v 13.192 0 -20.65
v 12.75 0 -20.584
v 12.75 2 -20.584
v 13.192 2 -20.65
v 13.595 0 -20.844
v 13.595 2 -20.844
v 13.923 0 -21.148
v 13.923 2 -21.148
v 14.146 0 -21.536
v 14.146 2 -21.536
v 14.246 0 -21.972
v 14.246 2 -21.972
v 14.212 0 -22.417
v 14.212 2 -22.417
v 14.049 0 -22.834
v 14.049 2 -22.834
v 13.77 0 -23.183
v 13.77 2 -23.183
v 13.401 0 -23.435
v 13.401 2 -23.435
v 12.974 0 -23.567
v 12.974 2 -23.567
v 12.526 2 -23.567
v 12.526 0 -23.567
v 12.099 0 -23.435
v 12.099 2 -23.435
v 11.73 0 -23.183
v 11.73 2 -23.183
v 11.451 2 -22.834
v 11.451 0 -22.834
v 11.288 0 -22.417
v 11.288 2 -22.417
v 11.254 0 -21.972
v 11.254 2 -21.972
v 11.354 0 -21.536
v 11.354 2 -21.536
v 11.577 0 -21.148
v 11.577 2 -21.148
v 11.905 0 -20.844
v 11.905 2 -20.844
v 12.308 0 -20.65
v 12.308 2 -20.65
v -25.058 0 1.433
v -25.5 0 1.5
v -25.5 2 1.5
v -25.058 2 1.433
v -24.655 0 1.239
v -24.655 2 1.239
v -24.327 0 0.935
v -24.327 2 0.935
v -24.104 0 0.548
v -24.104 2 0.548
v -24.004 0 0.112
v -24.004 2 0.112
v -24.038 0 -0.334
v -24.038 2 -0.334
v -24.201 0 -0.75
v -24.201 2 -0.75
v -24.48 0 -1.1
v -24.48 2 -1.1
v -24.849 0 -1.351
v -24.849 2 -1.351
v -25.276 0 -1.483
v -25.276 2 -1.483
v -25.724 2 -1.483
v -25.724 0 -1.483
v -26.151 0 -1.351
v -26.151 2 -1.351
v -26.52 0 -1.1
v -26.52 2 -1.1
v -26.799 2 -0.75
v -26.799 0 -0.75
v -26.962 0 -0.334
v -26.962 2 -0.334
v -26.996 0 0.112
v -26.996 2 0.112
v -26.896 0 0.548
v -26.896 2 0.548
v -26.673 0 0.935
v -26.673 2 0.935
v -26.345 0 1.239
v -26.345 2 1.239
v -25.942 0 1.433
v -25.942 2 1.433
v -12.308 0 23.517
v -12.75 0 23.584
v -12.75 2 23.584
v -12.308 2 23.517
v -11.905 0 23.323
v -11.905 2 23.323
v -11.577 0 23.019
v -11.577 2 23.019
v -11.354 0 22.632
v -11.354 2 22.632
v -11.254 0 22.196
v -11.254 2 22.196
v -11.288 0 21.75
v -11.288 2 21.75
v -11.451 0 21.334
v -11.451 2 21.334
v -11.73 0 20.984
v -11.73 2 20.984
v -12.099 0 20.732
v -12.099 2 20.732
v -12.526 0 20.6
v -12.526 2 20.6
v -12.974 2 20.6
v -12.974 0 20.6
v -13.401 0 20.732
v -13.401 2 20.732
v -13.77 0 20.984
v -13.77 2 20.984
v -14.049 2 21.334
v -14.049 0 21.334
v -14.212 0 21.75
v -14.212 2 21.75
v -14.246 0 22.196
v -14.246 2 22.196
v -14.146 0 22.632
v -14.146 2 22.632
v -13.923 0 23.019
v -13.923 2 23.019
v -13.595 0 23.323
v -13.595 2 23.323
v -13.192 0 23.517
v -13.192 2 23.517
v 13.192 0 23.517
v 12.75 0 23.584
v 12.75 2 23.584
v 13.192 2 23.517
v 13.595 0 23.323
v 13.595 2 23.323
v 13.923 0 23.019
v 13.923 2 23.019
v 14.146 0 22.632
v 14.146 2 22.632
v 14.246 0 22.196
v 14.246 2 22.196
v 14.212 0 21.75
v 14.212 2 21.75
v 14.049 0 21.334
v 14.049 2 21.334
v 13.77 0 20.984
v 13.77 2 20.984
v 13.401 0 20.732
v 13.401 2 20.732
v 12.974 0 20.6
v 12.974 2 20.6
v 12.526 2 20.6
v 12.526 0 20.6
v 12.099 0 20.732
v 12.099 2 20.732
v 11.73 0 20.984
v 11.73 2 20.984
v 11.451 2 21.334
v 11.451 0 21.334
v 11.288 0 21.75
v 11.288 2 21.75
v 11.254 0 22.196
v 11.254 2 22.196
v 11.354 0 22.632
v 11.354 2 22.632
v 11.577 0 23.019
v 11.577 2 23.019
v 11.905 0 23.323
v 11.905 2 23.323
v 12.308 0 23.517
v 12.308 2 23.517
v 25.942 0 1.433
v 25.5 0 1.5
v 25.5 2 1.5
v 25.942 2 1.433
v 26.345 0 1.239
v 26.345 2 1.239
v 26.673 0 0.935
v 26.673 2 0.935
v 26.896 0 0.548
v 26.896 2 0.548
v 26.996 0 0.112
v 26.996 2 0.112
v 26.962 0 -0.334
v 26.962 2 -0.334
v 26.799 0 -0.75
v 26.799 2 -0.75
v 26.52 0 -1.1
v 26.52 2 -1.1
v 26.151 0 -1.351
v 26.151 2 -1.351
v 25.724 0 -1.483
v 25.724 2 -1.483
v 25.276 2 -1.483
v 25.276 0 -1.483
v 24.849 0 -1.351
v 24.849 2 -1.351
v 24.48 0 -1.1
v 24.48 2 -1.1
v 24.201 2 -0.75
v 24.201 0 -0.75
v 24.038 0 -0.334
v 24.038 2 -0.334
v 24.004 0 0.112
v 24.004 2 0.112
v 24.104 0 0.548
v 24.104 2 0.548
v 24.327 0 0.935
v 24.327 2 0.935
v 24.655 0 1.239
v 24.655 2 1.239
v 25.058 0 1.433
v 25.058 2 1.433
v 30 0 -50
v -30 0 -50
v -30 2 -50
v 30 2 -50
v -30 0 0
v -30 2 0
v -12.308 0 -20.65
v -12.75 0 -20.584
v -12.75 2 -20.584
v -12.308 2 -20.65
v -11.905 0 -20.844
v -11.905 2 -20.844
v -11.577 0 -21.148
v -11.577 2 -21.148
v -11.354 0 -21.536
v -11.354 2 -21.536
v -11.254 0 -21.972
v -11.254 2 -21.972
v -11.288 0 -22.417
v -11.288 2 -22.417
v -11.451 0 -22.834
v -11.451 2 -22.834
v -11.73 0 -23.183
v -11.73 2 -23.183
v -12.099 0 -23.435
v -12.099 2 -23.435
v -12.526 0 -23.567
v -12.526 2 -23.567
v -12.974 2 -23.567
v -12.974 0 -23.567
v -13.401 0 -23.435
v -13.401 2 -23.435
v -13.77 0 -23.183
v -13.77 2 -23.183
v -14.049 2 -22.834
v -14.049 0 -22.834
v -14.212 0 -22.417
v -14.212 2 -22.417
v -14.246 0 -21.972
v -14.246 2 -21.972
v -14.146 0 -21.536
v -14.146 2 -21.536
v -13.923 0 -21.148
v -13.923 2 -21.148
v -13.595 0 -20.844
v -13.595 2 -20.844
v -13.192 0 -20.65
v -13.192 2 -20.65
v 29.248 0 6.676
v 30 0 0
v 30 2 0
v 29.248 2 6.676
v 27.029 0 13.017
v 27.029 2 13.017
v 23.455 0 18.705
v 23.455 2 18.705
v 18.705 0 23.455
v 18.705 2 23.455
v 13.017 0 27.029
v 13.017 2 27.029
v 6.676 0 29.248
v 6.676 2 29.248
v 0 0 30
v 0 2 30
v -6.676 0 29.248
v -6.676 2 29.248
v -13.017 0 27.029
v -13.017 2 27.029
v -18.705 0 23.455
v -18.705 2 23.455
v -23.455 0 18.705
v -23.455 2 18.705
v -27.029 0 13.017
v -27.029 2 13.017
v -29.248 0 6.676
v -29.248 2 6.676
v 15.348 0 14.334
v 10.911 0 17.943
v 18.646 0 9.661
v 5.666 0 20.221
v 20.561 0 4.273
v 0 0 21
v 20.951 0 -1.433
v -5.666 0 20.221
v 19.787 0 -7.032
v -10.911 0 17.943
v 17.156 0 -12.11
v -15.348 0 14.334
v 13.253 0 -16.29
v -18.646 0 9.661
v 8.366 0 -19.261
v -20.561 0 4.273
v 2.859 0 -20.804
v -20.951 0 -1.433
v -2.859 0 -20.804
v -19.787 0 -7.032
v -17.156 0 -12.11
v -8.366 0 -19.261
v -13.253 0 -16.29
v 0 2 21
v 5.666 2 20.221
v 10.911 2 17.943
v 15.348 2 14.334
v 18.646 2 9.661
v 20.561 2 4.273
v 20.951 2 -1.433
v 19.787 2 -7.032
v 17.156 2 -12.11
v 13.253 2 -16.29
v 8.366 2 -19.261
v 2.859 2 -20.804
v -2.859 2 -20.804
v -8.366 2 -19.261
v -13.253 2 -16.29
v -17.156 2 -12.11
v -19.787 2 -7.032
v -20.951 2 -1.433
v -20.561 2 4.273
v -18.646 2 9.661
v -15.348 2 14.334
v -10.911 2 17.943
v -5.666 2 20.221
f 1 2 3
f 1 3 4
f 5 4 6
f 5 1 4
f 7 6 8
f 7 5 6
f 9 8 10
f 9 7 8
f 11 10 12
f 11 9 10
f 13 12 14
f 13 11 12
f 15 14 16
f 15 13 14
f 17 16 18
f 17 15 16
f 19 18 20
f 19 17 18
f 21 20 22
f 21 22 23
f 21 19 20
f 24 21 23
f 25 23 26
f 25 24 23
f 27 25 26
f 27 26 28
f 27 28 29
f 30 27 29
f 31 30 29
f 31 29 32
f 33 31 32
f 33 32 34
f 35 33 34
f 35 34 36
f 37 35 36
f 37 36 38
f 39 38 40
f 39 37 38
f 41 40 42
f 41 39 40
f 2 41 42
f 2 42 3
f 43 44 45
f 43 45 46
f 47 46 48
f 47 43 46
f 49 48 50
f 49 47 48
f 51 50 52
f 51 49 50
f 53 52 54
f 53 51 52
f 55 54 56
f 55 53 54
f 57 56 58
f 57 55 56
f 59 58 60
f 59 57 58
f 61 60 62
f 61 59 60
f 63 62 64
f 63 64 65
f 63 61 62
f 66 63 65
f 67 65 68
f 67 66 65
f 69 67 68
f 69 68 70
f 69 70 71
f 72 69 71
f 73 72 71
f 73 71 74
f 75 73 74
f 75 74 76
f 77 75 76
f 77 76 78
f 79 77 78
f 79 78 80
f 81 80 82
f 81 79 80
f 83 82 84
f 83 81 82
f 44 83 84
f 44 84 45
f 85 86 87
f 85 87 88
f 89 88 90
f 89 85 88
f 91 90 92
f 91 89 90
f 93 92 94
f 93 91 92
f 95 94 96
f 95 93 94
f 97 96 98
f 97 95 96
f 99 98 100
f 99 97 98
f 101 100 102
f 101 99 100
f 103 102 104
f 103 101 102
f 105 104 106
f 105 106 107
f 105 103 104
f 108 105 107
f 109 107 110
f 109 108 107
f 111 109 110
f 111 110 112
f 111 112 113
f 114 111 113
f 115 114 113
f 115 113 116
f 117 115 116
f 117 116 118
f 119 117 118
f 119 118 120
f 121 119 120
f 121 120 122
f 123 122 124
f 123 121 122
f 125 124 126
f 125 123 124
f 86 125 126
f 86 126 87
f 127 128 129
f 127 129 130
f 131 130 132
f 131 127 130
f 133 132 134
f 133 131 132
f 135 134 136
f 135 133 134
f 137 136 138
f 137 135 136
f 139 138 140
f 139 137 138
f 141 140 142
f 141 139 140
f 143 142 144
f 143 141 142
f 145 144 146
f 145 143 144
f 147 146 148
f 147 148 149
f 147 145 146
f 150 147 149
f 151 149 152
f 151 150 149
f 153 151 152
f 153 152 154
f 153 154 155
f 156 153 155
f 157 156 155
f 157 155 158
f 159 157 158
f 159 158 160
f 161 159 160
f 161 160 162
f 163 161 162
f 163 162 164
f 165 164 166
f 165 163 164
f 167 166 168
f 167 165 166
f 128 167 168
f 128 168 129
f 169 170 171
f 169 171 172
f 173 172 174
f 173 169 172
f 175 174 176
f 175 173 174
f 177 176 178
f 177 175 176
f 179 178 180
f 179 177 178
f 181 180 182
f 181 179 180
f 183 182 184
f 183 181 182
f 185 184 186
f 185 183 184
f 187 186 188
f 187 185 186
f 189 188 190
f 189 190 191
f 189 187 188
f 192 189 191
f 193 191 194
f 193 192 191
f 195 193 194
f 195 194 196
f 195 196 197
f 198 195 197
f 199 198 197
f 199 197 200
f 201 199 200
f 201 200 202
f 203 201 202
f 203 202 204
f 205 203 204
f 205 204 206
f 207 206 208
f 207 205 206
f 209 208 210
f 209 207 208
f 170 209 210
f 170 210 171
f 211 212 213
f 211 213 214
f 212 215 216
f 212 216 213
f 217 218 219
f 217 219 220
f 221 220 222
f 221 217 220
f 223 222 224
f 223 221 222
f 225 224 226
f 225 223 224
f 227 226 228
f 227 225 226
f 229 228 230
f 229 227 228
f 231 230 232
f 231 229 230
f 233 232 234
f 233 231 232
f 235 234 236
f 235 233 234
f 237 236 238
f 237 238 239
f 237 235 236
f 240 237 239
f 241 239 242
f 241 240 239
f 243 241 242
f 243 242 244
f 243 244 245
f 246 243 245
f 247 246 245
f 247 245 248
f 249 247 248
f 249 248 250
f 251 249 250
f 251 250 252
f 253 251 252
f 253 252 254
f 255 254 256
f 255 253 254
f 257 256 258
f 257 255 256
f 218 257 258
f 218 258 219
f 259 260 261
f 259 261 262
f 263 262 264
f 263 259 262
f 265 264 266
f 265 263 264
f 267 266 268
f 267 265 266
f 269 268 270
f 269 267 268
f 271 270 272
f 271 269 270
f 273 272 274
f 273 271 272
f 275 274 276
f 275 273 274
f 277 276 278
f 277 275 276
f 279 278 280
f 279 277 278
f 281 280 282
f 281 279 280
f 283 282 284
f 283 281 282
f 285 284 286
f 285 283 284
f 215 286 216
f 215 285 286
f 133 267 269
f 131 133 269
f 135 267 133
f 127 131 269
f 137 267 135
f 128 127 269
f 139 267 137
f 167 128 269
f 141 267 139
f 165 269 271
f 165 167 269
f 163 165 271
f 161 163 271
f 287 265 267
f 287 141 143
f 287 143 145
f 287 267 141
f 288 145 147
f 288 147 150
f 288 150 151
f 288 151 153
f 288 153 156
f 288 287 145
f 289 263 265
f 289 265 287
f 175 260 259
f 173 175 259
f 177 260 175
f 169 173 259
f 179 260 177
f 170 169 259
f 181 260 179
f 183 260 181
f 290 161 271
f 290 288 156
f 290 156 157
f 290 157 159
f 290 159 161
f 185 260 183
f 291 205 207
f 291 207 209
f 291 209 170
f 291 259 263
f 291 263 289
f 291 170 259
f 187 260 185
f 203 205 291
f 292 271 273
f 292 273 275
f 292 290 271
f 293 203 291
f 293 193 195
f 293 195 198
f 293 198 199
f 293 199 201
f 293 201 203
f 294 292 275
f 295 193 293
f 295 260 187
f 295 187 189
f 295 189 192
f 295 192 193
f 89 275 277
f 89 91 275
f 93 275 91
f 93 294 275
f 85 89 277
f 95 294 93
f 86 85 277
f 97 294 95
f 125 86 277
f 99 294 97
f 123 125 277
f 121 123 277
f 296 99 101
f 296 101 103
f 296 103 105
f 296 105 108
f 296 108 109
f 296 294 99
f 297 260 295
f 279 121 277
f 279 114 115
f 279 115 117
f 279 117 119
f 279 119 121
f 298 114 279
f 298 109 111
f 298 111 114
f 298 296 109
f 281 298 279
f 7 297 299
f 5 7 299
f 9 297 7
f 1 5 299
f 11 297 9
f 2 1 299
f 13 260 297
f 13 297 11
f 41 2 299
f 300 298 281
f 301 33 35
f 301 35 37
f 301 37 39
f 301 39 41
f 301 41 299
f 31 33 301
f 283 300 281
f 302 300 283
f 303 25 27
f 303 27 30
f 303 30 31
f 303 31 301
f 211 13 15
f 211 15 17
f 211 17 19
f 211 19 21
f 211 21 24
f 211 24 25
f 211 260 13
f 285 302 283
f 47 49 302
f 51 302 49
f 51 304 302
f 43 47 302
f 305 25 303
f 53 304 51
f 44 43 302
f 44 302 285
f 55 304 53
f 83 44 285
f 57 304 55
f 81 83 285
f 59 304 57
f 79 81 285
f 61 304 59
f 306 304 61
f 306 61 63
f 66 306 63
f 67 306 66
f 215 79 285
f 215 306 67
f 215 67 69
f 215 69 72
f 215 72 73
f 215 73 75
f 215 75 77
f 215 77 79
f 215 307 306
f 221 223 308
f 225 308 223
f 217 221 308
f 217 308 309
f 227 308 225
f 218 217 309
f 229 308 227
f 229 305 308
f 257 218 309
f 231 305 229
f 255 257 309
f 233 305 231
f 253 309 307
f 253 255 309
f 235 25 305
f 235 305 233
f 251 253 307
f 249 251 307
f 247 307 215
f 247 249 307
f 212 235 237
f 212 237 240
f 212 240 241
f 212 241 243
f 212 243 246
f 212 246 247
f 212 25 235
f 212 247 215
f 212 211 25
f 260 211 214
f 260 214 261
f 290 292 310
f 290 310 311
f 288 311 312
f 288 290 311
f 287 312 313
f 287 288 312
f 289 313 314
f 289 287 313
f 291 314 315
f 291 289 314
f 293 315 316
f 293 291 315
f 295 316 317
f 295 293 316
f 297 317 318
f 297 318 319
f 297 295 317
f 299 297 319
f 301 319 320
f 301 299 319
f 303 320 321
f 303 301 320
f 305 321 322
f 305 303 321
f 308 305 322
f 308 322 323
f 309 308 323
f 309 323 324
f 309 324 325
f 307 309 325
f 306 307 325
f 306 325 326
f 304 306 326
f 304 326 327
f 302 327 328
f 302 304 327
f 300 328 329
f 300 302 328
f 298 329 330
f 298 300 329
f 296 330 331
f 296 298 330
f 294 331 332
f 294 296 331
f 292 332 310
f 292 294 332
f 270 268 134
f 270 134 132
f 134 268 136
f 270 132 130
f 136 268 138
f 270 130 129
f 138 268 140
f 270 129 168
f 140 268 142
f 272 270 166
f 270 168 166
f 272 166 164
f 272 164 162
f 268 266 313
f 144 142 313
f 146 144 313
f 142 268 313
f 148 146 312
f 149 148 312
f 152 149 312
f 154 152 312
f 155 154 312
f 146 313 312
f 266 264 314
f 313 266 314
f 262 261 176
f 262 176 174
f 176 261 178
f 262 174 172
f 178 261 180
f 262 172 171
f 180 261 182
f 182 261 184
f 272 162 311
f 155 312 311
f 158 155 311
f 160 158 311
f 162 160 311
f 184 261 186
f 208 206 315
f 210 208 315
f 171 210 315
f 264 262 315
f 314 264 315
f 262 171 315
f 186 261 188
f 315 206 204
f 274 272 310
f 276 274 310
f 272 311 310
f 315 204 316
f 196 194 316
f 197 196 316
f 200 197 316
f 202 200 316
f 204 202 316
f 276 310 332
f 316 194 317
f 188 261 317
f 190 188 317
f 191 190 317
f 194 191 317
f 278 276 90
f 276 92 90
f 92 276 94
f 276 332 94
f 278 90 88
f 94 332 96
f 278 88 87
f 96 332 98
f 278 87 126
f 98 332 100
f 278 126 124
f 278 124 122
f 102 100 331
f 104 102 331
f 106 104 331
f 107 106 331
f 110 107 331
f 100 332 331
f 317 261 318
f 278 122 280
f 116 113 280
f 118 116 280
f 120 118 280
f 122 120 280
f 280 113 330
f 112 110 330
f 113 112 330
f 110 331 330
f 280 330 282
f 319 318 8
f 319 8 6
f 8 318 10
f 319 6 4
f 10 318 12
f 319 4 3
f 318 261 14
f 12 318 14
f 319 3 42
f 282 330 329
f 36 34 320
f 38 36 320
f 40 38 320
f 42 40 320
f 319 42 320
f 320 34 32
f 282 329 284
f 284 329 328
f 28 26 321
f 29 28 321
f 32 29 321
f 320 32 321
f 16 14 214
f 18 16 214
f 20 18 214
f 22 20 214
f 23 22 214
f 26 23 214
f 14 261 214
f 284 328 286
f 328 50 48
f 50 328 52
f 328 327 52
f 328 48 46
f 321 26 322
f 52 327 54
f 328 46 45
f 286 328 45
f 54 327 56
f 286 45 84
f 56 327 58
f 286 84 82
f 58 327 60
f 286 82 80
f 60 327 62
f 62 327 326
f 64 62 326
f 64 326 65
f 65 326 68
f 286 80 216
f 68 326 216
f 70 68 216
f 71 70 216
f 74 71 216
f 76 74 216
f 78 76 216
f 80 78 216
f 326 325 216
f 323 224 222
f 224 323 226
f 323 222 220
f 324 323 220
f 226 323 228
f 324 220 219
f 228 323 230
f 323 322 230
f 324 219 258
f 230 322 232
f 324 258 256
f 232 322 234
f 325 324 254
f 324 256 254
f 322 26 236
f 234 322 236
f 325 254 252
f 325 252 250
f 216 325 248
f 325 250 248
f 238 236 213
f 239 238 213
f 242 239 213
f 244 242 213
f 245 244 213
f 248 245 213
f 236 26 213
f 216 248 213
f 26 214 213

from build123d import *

# Parameters (mm, degrees)
SKETCH1_R           = 21
SKETCH1_R_2         = 1.5
BOSS_EXTRUDE1_DEPTH = 2


with BuildPart() as part:
    # Sketch1 → Boss-Extrude1 (new body)
    with BuildSketch(Plane(origin=(0, 0, 0), x_dir=(1, 0, 0), z_dir=(0, 1, 0))):
        with BuildLine():
            Line((-30, 0), (-30, 50))
            Line((-30, 50), (30, 50))
            Line((30, 50), (30, 0))
            ThreePointArc((30, 0), (0, -30), (-30, 0))
        make_face()
        with Locations(Location((0, 0, 0), (0, 0, 270))):
            Circle(SKETCH1_R, mode=Mode.SUBTRACT)
        with Locations(Location((-12.75, 22.083647797, 0), (0, 0, 270))):
            Circle(SKETCH1_R_2, mode=Mode.SUBTRACT)
        with Locations(Location((12.75, 22.083647797, 0), (0, 0, 270))):
            Circle(SKETCH1_R_2, mode=Mode.SUBTRACT)
        with Locations(Location((25.5, 0, 0), (0, 0, 270))):
            Circle(SKETCH1_R_2, mode=Mode.SUBTRACT)
        with Locations(Location((12.75, -22.083647797, 0), (0, 0, 270))):
            Circle(SKETCH1_R_2, mode=Mode.SUBTRACT)
        with Locations(Location((-12.75, -22.083647797, 0), (0, 0, 270))):
            Circle(SKETCH1_R_2, mode=Mode.SUBTRACT)
        with Locations(Location((-25.5, 0, 0), (0, 0, 270))):
            Circle(SKETCH1_R_2, mode=Mode.SUBTRACT)
    extrude(amount=BOSS_EXTRUDE1_DEPTH)


solid = part.part
